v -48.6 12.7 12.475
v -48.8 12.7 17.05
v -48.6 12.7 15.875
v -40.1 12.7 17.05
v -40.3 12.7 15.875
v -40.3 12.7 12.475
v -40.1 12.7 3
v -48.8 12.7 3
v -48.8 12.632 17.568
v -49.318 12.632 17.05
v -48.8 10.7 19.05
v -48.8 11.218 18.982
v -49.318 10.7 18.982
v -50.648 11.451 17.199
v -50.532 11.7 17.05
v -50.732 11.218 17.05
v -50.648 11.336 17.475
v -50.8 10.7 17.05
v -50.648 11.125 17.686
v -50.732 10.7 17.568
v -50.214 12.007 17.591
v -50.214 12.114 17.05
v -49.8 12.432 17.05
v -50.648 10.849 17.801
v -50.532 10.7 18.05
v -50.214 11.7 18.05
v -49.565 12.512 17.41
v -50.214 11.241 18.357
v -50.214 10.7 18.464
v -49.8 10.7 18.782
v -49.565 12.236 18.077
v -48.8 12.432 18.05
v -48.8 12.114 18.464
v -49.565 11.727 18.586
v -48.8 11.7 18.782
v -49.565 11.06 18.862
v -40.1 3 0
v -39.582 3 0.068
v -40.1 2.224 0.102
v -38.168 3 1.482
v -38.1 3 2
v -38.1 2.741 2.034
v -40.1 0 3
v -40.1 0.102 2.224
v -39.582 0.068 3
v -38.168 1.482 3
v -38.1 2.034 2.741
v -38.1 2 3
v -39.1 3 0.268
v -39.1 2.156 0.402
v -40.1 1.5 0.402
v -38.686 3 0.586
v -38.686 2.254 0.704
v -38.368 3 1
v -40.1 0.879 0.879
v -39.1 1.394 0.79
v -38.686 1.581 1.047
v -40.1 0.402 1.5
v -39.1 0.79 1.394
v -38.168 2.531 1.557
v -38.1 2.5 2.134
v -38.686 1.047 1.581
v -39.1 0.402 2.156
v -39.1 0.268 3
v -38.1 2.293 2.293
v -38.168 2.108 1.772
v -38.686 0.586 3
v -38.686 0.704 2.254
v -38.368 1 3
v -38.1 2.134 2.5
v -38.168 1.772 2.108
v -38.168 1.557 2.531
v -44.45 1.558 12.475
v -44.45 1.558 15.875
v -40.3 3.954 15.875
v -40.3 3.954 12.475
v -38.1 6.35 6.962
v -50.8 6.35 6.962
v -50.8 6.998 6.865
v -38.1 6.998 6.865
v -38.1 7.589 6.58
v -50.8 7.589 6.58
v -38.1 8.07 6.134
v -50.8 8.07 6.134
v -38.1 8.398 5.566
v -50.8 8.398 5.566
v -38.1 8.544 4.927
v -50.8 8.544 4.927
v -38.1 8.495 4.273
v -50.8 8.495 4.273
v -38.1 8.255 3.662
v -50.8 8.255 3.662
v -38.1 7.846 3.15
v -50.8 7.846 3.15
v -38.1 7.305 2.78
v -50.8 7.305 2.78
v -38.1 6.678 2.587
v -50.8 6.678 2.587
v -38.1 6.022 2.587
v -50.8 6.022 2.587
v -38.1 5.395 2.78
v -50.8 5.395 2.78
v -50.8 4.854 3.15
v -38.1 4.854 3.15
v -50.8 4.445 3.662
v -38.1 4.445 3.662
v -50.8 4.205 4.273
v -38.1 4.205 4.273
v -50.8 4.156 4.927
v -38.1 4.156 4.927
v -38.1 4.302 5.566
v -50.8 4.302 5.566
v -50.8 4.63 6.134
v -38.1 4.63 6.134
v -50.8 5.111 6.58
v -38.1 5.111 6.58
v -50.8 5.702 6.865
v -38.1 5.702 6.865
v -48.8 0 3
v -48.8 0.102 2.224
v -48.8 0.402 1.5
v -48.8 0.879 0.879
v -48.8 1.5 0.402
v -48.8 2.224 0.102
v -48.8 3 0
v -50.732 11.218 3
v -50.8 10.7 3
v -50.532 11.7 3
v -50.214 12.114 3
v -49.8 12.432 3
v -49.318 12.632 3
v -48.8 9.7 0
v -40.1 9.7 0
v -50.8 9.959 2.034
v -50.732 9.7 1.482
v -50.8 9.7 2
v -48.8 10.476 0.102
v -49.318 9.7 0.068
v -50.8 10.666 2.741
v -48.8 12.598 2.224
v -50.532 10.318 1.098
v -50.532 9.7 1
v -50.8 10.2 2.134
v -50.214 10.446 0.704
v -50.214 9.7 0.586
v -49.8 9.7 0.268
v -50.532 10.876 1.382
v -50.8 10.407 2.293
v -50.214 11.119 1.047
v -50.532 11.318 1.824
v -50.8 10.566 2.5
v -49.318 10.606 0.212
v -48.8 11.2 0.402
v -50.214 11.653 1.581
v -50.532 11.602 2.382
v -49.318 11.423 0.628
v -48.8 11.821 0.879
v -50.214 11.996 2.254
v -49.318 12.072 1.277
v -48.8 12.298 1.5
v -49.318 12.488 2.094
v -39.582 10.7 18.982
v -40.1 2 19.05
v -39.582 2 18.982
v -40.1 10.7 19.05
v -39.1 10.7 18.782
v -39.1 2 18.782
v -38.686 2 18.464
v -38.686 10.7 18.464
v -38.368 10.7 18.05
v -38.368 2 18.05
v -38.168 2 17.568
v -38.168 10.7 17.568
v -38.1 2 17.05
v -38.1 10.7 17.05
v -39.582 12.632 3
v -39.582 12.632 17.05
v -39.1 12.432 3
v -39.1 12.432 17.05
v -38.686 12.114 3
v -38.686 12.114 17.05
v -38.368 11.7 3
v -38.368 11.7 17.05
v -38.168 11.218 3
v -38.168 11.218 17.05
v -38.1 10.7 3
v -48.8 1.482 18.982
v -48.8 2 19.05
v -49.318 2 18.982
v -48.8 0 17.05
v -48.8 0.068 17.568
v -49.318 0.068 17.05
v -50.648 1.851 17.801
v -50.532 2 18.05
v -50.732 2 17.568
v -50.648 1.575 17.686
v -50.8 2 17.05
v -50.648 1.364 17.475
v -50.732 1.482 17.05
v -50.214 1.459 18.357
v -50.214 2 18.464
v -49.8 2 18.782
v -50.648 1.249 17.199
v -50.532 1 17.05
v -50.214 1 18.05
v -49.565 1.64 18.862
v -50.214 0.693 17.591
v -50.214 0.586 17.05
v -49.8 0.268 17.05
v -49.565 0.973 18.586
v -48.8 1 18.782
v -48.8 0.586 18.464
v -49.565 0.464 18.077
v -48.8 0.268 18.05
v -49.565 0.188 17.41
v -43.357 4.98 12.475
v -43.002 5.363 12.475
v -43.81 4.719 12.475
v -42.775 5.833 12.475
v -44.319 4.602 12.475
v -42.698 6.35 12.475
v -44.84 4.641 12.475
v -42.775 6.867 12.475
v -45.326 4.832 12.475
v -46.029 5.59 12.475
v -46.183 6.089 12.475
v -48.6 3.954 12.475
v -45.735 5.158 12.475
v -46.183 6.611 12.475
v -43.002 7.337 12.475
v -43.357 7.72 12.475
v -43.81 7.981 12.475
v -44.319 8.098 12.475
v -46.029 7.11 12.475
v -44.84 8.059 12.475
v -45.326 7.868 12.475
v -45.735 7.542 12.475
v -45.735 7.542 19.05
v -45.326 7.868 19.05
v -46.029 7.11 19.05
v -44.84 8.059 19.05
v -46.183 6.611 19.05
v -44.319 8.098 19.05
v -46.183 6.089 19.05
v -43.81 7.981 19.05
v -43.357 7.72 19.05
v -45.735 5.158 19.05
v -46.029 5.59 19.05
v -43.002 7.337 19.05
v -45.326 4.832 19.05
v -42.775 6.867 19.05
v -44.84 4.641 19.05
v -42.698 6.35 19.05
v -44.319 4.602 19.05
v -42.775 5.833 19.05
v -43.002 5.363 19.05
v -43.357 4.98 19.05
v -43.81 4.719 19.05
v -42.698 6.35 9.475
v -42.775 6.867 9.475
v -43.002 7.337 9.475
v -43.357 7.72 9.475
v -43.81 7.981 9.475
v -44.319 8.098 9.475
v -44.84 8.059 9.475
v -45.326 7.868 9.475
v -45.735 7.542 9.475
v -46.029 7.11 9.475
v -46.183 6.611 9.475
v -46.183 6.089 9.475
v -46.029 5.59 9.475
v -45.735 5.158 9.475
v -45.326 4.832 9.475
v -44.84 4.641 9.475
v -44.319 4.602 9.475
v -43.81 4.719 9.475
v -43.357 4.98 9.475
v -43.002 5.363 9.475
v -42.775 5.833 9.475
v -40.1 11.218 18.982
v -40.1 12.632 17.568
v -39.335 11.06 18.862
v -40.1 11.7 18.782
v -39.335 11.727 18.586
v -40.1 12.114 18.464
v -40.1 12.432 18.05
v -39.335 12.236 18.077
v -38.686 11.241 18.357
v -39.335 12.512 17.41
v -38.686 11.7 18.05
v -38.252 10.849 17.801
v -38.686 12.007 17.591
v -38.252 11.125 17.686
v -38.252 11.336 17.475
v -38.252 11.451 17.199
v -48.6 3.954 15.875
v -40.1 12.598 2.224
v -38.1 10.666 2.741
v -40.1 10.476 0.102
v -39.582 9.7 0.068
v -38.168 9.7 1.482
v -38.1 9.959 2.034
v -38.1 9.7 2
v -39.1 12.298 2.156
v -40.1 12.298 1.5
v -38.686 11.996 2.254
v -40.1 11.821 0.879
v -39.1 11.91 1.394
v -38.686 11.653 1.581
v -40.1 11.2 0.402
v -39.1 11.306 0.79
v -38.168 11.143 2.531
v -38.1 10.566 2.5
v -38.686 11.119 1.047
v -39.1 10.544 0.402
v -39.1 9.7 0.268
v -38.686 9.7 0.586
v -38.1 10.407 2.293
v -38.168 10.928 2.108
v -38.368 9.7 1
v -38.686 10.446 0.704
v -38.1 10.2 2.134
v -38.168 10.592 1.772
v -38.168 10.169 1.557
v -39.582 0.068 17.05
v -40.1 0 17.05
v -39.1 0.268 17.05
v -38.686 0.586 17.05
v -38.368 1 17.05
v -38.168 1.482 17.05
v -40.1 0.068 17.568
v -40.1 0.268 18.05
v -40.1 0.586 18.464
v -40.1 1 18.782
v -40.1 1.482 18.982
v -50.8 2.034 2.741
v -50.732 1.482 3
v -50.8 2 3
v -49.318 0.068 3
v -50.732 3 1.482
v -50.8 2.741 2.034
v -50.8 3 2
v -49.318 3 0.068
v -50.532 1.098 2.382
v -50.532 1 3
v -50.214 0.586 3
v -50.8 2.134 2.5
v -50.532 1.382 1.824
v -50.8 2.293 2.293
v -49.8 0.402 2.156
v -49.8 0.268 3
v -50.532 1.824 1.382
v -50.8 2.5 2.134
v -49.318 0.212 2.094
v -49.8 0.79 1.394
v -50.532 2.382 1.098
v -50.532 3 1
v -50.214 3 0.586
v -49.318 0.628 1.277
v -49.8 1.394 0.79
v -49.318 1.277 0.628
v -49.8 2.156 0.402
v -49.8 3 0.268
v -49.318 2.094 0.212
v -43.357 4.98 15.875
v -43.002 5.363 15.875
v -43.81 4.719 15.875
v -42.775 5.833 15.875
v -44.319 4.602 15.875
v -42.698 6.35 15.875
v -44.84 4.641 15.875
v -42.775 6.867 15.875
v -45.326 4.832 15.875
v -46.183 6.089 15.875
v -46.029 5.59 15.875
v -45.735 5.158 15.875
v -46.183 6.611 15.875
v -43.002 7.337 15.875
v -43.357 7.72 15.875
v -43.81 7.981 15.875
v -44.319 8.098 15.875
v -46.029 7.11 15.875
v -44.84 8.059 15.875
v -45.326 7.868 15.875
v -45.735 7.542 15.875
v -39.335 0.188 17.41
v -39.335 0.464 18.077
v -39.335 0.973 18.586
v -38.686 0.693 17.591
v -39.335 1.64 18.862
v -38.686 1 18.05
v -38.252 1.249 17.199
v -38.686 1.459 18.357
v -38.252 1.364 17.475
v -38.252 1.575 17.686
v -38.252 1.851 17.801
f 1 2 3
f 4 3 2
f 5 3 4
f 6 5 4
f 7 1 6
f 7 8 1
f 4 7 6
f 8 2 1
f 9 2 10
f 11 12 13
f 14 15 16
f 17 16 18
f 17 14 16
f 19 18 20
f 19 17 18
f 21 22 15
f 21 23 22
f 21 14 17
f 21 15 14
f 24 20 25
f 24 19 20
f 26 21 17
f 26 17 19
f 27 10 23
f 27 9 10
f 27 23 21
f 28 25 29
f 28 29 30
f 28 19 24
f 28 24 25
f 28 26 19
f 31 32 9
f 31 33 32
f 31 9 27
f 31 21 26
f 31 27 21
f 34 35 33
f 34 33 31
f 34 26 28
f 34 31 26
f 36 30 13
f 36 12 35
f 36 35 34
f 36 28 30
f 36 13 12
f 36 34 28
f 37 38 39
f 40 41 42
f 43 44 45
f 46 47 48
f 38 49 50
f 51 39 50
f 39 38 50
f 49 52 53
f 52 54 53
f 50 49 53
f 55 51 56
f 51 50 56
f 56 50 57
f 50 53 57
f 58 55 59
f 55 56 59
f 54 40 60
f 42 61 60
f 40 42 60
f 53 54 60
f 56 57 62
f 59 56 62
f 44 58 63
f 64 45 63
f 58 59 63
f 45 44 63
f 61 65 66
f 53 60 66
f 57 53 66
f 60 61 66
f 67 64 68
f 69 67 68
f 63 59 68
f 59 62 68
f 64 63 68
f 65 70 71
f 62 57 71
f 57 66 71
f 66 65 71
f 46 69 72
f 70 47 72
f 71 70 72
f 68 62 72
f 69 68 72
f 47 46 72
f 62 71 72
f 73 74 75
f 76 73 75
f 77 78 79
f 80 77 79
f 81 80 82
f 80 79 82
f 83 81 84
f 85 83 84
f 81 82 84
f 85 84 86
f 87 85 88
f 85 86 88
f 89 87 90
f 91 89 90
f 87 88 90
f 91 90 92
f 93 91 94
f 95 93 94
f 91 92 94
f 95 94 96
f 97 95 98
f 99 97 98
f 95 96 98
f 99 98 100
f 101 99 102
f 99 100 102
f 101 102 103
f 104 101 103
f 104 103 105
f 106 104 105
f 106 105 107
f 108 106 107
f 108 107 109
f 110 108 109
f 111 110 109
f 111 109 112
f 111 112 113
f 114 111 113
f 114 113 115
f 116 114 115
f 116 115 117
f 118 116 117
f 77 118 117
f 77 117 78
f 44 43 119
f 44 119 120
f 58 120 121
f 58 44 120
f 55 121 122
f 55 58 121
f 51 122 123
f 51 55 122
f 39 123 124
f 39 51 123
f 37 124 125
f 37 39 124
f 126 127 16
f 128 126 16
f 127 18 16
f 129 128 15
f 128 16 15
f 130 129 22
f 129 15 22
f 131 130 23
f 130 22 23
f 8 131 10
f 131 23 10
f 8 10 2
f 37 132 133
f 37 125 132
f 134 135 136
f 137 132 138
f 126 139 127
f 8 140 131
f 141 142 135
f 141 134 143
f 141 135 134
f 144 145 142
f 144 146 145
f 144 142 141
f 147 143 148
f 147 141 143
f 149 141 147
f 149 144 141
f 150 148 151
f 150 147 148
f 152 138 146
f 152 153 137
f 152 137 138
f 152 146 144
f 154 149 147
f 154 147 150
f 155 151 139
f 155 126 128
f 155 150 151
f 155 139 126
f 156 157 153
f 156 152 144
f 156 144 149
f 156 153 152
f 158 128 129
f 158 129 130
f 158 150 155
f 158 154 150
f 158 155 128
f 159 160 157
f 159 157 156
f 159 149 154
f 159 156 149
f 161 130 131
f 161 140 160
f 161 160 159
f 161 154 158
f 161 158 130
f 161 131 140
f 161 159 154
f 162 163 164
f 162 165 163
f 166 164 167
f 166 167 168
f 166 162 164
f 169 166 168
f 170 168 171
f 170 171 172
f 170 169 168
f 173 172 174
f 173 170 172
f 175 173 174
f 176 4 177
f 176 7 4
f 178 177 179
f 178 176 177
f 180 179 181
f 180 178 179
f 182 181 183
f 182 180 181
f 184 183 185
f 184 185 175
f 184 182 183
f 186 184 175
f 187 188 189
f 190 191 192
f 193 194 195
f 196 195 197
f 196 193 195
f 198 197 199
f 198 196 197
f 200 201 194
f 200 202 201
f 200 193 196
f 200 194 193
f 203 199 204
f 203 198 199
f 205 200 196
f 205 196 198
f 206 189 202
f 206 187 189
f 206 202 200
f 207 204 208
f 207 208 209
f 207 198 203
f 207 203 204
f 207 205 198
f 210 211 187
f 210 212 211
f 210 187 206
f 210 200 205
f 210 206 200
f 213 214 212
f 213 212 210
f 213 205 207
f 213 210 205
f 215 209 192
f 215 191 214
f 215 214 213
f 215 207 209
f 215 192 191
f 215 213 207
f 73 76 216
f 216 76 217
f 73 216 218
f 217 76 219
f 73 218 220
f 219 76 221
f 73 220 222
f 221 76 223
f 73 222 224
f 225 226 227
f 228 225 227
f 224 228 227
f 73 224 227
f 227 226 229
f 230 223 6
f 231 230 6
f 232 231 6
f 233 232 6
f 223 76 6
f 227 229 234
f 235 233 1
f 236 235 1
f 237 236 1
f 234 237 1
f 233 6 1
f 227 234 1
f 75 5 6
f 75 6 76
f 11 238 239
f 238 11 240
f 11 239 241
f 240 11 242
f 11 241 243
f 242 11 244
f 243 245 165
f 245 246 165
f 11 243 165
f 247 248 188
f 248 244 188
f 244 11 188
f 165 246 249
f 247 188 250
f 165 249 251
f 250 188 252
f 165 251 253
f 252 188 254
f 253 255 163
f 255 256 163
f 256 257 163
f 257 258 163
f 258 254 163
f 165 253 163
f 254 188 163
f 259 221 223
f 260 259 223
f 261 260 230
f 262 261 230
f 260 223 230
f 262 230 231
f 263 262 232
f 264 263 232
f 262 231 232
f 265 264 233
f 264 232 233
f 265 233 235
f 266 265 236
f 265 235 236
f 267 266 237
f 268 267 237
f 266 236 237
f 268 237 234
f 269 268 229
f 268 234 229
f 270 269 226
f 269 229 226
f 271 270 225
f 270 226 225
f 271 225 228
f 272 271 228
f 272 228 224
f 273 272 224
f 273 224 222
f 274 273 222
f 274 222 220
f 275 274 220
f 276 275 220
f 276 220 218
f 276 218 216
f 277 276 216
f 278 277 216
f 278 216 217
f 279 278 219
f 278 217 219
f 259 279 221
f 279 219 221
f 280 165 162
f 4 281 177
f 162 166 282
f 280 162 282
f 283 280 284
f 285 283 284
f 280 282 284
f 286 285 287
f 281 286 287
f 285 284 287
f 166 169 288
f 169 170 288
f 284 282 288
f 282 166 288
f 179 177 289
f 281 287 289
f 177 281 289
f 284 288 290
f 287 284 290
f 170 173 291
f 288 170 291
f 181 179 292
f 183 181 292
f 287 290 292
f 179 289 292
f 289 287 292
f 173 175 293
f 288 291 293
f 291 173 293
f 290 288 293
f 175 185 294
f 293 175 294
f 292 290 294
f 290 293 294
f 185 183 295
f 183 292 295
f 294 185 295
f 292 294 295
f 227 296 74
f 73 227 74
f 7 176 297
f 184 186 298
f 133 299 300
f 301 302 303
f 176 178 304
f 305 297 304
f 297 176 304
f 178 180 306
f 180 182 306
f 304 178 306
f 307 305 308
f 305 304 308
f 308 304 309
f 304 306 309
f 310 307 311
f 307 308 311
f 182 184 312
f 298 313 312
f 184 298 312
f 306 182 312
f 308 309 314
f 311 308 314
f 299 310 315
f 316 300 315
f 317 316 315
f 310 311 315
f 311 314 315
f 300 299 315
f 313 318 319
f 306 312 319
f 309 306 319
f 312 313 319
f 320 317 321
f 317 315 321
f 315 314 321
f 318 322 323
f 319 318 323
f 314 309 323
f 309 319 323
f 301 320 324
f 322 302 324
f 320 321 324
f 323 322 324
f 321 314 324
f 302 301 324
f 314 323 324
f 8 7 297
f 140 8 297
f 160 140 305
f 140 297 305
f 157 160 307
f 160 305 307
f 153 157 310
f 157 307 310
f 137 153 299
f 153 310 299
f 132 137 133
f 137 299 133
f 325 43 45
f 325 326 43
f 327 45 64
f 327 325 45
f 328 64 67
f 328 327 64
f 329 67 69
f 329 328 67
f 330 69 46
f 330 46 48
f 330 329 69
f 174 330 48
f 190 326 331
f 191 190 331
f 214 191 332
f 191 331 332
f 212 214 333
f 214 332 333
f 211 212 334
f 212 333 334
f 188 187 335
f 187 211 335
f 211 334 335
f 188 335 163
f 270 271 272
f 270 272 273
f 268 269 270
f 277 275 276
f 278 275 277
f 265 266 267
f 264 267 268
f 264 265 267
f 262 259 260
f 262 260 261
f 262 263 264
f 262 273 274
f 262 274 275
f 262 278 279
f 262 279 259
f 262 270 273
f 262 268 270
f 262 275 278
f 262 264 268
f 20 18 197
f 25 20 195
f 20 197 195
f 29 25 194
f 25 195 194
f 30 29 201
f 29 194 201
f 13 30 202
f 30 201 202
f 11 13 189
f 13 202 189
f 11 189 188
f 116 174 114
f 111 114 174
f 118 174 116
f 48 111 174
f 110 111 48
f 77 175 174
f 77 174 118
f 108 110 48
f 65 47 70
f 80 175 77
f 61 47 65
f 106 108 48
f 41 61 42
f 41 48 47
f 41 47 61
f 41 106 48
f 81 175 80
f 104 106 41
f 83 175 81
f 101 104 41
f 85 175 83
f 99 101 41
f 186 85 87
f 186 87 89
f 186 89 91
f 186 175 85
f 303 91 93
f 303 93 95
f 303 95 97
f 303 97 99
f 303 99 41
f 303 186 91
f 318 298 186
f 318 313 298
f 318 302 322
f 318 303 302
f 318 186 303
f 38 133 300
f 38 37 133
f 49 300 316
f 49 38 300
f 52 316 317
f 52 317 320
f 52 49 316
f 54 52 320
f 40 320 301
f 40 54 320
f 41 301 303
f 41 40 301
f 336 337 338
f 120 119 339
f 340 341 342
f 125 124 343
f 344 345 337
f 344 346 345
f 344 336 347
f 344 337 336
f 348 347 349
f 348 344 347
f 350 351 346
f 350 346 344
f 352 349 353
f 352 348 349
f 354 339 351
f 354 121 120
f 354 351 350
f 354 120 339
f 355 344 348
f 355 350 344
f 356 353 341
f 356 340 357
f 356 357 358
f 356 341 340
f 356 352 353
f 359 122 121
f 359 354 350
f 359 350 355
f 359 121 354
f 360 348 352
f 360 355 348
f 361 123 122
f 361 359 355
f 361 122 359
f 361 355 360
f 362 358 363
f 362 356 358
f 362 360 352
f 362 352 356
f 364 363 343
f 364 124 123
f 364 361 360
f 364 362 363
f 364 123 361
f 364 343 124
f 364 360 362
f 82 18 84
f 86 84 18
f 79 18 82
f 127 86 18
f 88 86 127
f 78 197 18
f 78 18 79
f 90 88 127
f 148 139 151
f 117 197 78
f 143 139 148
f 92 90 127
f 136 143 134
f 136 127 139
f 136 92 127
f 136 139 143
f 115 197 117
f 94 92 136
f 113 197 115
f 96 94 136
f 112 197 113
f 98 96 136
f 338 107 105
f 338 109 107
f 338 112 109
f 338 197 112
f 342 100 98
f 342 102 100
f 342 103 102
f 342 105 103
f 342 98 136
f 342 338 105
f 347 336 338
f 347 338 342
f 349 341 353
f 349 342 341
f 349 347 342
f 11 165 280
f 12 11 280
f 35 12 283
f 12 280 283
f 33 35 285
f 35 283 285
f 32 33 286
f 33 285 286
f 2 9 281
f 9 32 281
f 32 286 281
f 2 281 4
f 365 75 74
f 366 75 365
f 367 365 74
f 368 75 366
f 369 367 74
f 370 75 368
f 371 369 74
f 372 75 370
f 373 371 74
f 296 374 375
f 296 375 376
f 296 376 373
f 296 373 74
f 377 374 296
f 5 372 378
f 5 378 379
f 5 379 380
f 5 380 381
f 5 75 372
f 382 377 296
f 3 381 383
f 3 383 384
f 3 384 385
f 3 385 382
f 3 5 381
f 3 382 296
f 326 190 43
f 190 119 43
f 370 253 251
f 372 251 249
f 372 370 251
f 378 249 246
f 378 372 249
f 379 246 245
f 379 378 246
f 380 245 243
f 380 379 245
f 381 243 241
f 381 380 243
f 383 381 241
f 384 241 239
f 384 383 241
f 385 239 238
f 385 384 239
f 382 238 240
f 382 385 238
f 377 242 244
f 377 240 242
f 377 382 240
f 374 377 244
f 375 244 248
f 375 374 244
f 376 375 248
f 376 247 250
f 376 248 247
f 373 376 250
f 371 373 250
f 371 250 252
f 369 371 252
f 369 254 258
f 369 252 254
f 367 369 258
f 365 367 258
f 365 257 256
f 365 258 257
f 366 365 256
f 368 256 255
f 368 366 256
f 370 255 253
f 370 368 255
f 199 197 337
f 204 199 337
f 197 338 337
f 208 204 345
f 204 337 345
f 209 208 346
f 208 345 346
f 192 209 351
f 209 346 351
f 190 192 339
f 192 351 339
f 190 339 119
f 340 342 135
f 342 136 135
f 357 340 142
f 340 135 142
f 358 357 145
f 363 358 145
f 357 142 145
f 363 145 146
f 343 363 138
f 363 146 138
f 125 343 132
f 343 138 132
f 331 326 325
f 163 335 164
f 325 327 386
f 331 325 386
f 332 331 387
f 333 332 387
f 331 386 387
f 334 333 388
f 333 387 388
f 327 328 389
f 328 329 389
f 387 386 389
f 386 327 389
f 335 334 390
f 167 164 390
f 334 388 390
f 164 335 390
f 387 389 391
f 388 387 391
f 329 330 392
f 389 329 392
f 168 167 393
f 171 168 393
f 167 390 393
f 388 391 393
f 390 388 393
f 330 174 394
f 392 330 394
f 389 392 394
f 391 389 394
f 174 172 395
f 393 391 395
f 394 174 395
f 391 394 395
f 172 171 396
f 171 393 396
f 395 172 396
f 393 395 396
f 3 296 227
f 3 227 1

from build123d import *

# Parameters (mm, degrees)
SKETCH1_W           = 50.8
SKETCH1_H           = 19.05
BOSS_EXTRUDE1_DEPTH = 12.7
SKETCH2_R           = 2.2
CUT_EXTRUDE1_DEPTH  = 56.72102386
SKETCH4_R           = 1.7525
CUT_EXTRUDE3_DEPTH  = 3.4
CUT_EXTRUDE4_START  = -3.4
SKETCH4_3_R         = 1.7525
CUT_EXTRUDE4_DEPTH  = 3
CUT_EXTRUDE5_REACH  = 56.717
SKETCH4_4_R         = 1.7525
CUT_EXTRUDE6_REACH  = 57.721
SKETCH5_W           = 38.1
SKETCH5_H           = 19.05
FILLET1_R           = 3
FILLET2_R           = 2
FILLET3_R           = 2


with BuildPart() as part:
    # Sketch1 → Boss-Extrude1 (new body)
    with BuildSketch(Plane(origin=(0, 0, 0), x_dir=(1, 0, 0), z_dir=(0, 1, 0))):
        with Locations((-25.4, -9.525)):
            Rectangle(SKETCH1_W, SKETCH1_H)
    extrude(amount=BOSS_EXTRUDE1_DEPTH)

    # Sketch2 → Cut-Extrude1 (cut, through all)
    with BuildSketch(Plane.ZY.offset(50.8)):
        with Locations((4.7625, 6.35)):
            Circle(SKETCH2_R)
    extrude(amount=-CUT_EXTRUDE1_DEPTH, mode=Mode.SUBTRACT)

    # Sketch4 → Cut-Extrude3 (cut)
    # profile 1 of 9: a face of its own
    with BuildSketch(Plane.XY.offset(15.875)):
        Polygon((-40.3, 12.7), (-40.3, 8.746003617), (-44.45, 11.142007234), (-48.6, 8.746003617), (-48.6, 12.7), align=None)
    # profile 2 of 9: a face of its own
    with BuildSketch(Plane.XY.offset(15.875)):
        Polygon((-48.6, 8.746003617), (-48.6, 3.953996383), (-44.45, 1.557992766), (-40.3, 3.953996383), (-40.3, 8.746003617), (-44.45, 11.142007234), align=None)
        with Locations((-44.45, 6.35)):
            Circle(SKETCH4_R, mode=Mode.SUBTRACT)
    # profile 3 of 9: a face of its own
    with BuildSketch(Plane.XY.offset(15.875)):
        Polygon((-35.9, 12.7), (-27.6, 12.7), (-27.6, 8.746003617), (-27.6, 3.953996383), (-31.75, 1.557992766), (-35.9, 3.953996383), (-35.9, 8.746003617), align=None)
        with Locations((-31.75, 6.35)):
            Circle(SKETCH4_R, mode=Mode.SUBTRACT)
    # profile 4 of 9: a face of its own
    with BuildSketch(Plane.XY.offset(15.875)):
        with Locations((-31.75, 6.35)):
            Circle(SKETCH4_R)
    # profile 5 of 9: a face of its own
    with BuildSketch(Plane.XY.offset(15.875)):
        with Locations((-44.45, 6.35)):
            Circle(SKETCH4_R)
    # profile 6 of 9: a face of its own
    with BuildSketch(Plane.XY.offset(15.875)):
        Polygon((-23.2, 12.7), (-14.9, 12.7), (-14.9, 8.746003617), (-14.9, 3.953996383), (-19.05, 1.557992766), (-23.2, 3.953996383), (-23.2, 8.746003617), align=None)
        with Locations((-19.05, 6.35)):
            Circle(SKETCH4_R, mode=Mode.SUBTRACT)
    # profile 7 of 9: a face of its own
    with BuildSketch(Plane.XY.offset(15.875)):
        with Locations((-19.05, 6.35)):
            Circle(SKETCH4_R)
    # profile 8 of 9: a face of its own
    with BuildSketch(Plane.XY.offset(15.875)):
        Polygon((-10.5, 12.7), (-2.2, 12.7), (-2.2, 8.746003617), (-2.2, 3.953996383), (-6.35, 1.557992766), (-10.5, 3.953996383), (-10.5, 8.746003617), align=None)
        with Locations((-6.35, 6.35)):
            Circle(SKETCH4_R, mode=Mode.SUBTRACT)
    # profile 9 of 9: a face of its own
    with BuildSketch(Plane.XY.offset(15.875)):
        with Locations((-6.35, 6.35)):
            Circle(SKETCH4_R)
    extrude(amount=-CUT_EXTRUDE3_DEPTH, mode=Mode.SUBTRACT)

    # Sketch4<3> → Cut-Extrude4 (cut)
    with BuildSketch(Plane.XY.offset(15.875).offset(CUT_EXTRUDE4_START)):
        with Locations((-44.45, 6.35)):
            Circle(SKETCH4_3_R)
        with Locations((-31.75, 6.35)):
            Circle(SKETCH4_3_R)
        with Locations((-19.05, 6.35)):
            Circle(SKETCH4_3_R)
        with Locations((-6.35, 6.35)):
            Circle(SKETCH4_3_R)
    extrude(amount=-CUT_EXTRUDE4_DEPTH, mode=Mode.SUBTRACT)

    # Sketch4<4> → Cut-Extrude5 (cut, up to next)
    with BuildSketch(Plane.XY.offset(15.875), mode=Mode.PRIVATE) as cut_extrude5_sk1:
        with Locations((-44.45, 6.35)):
            Circle(SKETCH4_4_R)
    cut_extrude5_tool1 = extrude(cut_extrude5_sk1.sketch, amount=CUT_EXTRUDE5_REACH, mode=Mode.PRIVATE) & part.part
    # Sketch4<4> → Cut-Extrude5 (cut, up to next)
    with BuildSketch(Plane.XY.offset(15.875), mode=Mode.PRIVATE) as cut_extrude5_sk2:
        with Locations((-31.75, 6.35)):
            Circle(SKETCH4_4_R)
    cut_extrude5_tool2 = extrude(cut_extrude5_sk2.sketch, amount=CUT_EXTRUDE5_REACH, mode=Mode.PRIVATE) & part.part
    # Sketch4<4> → Cut-Extrude5 (cut, up to next)
    with BuildSketch(Plane.XY.offset(15.875), mode=Mode.PRIVATE) as cut_extrude5_sk3:
        with Locations((-19.05, 6.35)):
            Circle(SKETCH4_4_R)
    cut_extrude5_tool3 = extrude(cut_extrude5_sk3.sketch, amount=CUT_EXTRUDE5_REACH, mode=Mode.PRIVATE) & part.part
    # Sketch4<4> → Cut-Extrude5 (cut, up to next)
    with BuildSketch(Plane.XY.offset(15.875), mode=Mode.PRIVATE) as cut_extrude5_sk4:
        with Locations((-6.35, 6.35)):
            Circle(SKETCH4_4_R)
    cut_extrude5_tool4 = extrude(cut_extrude5_sk4.sketch, amount=CUT_EXTRUDE5_REACH, mode=Mode.PRIVATE) & part.part
    add(cut_extrude5_tool1.solids().sort_by_distance((-44.45, 6.35, 15.875))[0], mode=Mode.SUBTRACT)
    add(cut_extrude5_tool2.solids().sort_by_distance((-31.75, 6.35, 15.875))[0], mode=Mode.SUBTRACT)
    add(cut_extrude5_tool3.solids().sort_by_distance((-19.05, 6.35, 15.875))[0], mode=Mode.SUBTRACT)
    add(cut_extrude5_tool4.solids().sort_by_distance((-6.35, 6.35, 15.875))[0], mode=Mode.SUBTRACT)

    # Sketch5 → Cut-Extrude6 (cut, up to next)
    with BuildSketch(Plane(origin=(0, 12.7, 0), x_dir=(1, 0, 0), z_dir=(0, 1, 0)), mode=Mode.PRIVATE) as cut_extrude6_sk1:
        with Locations((-19.05, -9.525)):
            Rectangle(SKETCH5_W, SKETCH5_H)
    cut_extrude6_tool1 = extrude(cut_extrude6_sk1.sketch, amount=-CUT_EXTRUDE6_REACH, mode=Mode.PRIVATE) & part.part
    add(cut_extrude6_tool1.solids().sort_by_distance((-19.05, 12.7, 9.525))[0], mode=Mode.SUBTRACT)

    # Fillet1
    fillet1_edges = [part.edges().sort_by_distance(p)[0] for p in [
        (-44.45, 0, 0),
        (-44.45, 12.7, 0),
    ]]
    fillet(fillet1_edges, radius=FILLET1_R)

    # Fillet2
    fillet2_edges = [part.edges().sort_by_distance(p)[0] for p in [
        (-44.45, 12.7, 19.05),
        (-44.45, 0, 19.05),
    ]]
    fillet(fillet2_edges, radius=FILLET2_R)

    # Fillet3
    fillet3_edges = [part.edges().sort_by_distance(p)[0] for p in [
        (-38.1, 6.35, 0),
        (-50.8, 6.35, 0),
        (-50.8, 0, 10.025),
        (-50.8, 12.7, 10.025),
        (-50.8, 11.821320344, 0.878679656),
        (-50.8, 0.878679656, 0.878679656),
        (-38.1, 0, 10.025),
        (-38.1, 12.7, 10.025),
        (-38.1, 11.821320344, 0.878679656),
        (-38.1, 0.878679656, 0.878679656),
        (-38.1, 6.35, 19.05),
        (-50.8, 6.35, 19.05),
        (-38.1, 12.114213562, 18.464213562),
        (-38.1, 0.585786438, 18.464213562),
        (-50.8, 12.114213562, 18.464213562),
        (-50.8, 0.585786438, 18.464213562),
    ]]
    fillet(fillet3_edges, radius=FILLET3_R)


solid = part.part
